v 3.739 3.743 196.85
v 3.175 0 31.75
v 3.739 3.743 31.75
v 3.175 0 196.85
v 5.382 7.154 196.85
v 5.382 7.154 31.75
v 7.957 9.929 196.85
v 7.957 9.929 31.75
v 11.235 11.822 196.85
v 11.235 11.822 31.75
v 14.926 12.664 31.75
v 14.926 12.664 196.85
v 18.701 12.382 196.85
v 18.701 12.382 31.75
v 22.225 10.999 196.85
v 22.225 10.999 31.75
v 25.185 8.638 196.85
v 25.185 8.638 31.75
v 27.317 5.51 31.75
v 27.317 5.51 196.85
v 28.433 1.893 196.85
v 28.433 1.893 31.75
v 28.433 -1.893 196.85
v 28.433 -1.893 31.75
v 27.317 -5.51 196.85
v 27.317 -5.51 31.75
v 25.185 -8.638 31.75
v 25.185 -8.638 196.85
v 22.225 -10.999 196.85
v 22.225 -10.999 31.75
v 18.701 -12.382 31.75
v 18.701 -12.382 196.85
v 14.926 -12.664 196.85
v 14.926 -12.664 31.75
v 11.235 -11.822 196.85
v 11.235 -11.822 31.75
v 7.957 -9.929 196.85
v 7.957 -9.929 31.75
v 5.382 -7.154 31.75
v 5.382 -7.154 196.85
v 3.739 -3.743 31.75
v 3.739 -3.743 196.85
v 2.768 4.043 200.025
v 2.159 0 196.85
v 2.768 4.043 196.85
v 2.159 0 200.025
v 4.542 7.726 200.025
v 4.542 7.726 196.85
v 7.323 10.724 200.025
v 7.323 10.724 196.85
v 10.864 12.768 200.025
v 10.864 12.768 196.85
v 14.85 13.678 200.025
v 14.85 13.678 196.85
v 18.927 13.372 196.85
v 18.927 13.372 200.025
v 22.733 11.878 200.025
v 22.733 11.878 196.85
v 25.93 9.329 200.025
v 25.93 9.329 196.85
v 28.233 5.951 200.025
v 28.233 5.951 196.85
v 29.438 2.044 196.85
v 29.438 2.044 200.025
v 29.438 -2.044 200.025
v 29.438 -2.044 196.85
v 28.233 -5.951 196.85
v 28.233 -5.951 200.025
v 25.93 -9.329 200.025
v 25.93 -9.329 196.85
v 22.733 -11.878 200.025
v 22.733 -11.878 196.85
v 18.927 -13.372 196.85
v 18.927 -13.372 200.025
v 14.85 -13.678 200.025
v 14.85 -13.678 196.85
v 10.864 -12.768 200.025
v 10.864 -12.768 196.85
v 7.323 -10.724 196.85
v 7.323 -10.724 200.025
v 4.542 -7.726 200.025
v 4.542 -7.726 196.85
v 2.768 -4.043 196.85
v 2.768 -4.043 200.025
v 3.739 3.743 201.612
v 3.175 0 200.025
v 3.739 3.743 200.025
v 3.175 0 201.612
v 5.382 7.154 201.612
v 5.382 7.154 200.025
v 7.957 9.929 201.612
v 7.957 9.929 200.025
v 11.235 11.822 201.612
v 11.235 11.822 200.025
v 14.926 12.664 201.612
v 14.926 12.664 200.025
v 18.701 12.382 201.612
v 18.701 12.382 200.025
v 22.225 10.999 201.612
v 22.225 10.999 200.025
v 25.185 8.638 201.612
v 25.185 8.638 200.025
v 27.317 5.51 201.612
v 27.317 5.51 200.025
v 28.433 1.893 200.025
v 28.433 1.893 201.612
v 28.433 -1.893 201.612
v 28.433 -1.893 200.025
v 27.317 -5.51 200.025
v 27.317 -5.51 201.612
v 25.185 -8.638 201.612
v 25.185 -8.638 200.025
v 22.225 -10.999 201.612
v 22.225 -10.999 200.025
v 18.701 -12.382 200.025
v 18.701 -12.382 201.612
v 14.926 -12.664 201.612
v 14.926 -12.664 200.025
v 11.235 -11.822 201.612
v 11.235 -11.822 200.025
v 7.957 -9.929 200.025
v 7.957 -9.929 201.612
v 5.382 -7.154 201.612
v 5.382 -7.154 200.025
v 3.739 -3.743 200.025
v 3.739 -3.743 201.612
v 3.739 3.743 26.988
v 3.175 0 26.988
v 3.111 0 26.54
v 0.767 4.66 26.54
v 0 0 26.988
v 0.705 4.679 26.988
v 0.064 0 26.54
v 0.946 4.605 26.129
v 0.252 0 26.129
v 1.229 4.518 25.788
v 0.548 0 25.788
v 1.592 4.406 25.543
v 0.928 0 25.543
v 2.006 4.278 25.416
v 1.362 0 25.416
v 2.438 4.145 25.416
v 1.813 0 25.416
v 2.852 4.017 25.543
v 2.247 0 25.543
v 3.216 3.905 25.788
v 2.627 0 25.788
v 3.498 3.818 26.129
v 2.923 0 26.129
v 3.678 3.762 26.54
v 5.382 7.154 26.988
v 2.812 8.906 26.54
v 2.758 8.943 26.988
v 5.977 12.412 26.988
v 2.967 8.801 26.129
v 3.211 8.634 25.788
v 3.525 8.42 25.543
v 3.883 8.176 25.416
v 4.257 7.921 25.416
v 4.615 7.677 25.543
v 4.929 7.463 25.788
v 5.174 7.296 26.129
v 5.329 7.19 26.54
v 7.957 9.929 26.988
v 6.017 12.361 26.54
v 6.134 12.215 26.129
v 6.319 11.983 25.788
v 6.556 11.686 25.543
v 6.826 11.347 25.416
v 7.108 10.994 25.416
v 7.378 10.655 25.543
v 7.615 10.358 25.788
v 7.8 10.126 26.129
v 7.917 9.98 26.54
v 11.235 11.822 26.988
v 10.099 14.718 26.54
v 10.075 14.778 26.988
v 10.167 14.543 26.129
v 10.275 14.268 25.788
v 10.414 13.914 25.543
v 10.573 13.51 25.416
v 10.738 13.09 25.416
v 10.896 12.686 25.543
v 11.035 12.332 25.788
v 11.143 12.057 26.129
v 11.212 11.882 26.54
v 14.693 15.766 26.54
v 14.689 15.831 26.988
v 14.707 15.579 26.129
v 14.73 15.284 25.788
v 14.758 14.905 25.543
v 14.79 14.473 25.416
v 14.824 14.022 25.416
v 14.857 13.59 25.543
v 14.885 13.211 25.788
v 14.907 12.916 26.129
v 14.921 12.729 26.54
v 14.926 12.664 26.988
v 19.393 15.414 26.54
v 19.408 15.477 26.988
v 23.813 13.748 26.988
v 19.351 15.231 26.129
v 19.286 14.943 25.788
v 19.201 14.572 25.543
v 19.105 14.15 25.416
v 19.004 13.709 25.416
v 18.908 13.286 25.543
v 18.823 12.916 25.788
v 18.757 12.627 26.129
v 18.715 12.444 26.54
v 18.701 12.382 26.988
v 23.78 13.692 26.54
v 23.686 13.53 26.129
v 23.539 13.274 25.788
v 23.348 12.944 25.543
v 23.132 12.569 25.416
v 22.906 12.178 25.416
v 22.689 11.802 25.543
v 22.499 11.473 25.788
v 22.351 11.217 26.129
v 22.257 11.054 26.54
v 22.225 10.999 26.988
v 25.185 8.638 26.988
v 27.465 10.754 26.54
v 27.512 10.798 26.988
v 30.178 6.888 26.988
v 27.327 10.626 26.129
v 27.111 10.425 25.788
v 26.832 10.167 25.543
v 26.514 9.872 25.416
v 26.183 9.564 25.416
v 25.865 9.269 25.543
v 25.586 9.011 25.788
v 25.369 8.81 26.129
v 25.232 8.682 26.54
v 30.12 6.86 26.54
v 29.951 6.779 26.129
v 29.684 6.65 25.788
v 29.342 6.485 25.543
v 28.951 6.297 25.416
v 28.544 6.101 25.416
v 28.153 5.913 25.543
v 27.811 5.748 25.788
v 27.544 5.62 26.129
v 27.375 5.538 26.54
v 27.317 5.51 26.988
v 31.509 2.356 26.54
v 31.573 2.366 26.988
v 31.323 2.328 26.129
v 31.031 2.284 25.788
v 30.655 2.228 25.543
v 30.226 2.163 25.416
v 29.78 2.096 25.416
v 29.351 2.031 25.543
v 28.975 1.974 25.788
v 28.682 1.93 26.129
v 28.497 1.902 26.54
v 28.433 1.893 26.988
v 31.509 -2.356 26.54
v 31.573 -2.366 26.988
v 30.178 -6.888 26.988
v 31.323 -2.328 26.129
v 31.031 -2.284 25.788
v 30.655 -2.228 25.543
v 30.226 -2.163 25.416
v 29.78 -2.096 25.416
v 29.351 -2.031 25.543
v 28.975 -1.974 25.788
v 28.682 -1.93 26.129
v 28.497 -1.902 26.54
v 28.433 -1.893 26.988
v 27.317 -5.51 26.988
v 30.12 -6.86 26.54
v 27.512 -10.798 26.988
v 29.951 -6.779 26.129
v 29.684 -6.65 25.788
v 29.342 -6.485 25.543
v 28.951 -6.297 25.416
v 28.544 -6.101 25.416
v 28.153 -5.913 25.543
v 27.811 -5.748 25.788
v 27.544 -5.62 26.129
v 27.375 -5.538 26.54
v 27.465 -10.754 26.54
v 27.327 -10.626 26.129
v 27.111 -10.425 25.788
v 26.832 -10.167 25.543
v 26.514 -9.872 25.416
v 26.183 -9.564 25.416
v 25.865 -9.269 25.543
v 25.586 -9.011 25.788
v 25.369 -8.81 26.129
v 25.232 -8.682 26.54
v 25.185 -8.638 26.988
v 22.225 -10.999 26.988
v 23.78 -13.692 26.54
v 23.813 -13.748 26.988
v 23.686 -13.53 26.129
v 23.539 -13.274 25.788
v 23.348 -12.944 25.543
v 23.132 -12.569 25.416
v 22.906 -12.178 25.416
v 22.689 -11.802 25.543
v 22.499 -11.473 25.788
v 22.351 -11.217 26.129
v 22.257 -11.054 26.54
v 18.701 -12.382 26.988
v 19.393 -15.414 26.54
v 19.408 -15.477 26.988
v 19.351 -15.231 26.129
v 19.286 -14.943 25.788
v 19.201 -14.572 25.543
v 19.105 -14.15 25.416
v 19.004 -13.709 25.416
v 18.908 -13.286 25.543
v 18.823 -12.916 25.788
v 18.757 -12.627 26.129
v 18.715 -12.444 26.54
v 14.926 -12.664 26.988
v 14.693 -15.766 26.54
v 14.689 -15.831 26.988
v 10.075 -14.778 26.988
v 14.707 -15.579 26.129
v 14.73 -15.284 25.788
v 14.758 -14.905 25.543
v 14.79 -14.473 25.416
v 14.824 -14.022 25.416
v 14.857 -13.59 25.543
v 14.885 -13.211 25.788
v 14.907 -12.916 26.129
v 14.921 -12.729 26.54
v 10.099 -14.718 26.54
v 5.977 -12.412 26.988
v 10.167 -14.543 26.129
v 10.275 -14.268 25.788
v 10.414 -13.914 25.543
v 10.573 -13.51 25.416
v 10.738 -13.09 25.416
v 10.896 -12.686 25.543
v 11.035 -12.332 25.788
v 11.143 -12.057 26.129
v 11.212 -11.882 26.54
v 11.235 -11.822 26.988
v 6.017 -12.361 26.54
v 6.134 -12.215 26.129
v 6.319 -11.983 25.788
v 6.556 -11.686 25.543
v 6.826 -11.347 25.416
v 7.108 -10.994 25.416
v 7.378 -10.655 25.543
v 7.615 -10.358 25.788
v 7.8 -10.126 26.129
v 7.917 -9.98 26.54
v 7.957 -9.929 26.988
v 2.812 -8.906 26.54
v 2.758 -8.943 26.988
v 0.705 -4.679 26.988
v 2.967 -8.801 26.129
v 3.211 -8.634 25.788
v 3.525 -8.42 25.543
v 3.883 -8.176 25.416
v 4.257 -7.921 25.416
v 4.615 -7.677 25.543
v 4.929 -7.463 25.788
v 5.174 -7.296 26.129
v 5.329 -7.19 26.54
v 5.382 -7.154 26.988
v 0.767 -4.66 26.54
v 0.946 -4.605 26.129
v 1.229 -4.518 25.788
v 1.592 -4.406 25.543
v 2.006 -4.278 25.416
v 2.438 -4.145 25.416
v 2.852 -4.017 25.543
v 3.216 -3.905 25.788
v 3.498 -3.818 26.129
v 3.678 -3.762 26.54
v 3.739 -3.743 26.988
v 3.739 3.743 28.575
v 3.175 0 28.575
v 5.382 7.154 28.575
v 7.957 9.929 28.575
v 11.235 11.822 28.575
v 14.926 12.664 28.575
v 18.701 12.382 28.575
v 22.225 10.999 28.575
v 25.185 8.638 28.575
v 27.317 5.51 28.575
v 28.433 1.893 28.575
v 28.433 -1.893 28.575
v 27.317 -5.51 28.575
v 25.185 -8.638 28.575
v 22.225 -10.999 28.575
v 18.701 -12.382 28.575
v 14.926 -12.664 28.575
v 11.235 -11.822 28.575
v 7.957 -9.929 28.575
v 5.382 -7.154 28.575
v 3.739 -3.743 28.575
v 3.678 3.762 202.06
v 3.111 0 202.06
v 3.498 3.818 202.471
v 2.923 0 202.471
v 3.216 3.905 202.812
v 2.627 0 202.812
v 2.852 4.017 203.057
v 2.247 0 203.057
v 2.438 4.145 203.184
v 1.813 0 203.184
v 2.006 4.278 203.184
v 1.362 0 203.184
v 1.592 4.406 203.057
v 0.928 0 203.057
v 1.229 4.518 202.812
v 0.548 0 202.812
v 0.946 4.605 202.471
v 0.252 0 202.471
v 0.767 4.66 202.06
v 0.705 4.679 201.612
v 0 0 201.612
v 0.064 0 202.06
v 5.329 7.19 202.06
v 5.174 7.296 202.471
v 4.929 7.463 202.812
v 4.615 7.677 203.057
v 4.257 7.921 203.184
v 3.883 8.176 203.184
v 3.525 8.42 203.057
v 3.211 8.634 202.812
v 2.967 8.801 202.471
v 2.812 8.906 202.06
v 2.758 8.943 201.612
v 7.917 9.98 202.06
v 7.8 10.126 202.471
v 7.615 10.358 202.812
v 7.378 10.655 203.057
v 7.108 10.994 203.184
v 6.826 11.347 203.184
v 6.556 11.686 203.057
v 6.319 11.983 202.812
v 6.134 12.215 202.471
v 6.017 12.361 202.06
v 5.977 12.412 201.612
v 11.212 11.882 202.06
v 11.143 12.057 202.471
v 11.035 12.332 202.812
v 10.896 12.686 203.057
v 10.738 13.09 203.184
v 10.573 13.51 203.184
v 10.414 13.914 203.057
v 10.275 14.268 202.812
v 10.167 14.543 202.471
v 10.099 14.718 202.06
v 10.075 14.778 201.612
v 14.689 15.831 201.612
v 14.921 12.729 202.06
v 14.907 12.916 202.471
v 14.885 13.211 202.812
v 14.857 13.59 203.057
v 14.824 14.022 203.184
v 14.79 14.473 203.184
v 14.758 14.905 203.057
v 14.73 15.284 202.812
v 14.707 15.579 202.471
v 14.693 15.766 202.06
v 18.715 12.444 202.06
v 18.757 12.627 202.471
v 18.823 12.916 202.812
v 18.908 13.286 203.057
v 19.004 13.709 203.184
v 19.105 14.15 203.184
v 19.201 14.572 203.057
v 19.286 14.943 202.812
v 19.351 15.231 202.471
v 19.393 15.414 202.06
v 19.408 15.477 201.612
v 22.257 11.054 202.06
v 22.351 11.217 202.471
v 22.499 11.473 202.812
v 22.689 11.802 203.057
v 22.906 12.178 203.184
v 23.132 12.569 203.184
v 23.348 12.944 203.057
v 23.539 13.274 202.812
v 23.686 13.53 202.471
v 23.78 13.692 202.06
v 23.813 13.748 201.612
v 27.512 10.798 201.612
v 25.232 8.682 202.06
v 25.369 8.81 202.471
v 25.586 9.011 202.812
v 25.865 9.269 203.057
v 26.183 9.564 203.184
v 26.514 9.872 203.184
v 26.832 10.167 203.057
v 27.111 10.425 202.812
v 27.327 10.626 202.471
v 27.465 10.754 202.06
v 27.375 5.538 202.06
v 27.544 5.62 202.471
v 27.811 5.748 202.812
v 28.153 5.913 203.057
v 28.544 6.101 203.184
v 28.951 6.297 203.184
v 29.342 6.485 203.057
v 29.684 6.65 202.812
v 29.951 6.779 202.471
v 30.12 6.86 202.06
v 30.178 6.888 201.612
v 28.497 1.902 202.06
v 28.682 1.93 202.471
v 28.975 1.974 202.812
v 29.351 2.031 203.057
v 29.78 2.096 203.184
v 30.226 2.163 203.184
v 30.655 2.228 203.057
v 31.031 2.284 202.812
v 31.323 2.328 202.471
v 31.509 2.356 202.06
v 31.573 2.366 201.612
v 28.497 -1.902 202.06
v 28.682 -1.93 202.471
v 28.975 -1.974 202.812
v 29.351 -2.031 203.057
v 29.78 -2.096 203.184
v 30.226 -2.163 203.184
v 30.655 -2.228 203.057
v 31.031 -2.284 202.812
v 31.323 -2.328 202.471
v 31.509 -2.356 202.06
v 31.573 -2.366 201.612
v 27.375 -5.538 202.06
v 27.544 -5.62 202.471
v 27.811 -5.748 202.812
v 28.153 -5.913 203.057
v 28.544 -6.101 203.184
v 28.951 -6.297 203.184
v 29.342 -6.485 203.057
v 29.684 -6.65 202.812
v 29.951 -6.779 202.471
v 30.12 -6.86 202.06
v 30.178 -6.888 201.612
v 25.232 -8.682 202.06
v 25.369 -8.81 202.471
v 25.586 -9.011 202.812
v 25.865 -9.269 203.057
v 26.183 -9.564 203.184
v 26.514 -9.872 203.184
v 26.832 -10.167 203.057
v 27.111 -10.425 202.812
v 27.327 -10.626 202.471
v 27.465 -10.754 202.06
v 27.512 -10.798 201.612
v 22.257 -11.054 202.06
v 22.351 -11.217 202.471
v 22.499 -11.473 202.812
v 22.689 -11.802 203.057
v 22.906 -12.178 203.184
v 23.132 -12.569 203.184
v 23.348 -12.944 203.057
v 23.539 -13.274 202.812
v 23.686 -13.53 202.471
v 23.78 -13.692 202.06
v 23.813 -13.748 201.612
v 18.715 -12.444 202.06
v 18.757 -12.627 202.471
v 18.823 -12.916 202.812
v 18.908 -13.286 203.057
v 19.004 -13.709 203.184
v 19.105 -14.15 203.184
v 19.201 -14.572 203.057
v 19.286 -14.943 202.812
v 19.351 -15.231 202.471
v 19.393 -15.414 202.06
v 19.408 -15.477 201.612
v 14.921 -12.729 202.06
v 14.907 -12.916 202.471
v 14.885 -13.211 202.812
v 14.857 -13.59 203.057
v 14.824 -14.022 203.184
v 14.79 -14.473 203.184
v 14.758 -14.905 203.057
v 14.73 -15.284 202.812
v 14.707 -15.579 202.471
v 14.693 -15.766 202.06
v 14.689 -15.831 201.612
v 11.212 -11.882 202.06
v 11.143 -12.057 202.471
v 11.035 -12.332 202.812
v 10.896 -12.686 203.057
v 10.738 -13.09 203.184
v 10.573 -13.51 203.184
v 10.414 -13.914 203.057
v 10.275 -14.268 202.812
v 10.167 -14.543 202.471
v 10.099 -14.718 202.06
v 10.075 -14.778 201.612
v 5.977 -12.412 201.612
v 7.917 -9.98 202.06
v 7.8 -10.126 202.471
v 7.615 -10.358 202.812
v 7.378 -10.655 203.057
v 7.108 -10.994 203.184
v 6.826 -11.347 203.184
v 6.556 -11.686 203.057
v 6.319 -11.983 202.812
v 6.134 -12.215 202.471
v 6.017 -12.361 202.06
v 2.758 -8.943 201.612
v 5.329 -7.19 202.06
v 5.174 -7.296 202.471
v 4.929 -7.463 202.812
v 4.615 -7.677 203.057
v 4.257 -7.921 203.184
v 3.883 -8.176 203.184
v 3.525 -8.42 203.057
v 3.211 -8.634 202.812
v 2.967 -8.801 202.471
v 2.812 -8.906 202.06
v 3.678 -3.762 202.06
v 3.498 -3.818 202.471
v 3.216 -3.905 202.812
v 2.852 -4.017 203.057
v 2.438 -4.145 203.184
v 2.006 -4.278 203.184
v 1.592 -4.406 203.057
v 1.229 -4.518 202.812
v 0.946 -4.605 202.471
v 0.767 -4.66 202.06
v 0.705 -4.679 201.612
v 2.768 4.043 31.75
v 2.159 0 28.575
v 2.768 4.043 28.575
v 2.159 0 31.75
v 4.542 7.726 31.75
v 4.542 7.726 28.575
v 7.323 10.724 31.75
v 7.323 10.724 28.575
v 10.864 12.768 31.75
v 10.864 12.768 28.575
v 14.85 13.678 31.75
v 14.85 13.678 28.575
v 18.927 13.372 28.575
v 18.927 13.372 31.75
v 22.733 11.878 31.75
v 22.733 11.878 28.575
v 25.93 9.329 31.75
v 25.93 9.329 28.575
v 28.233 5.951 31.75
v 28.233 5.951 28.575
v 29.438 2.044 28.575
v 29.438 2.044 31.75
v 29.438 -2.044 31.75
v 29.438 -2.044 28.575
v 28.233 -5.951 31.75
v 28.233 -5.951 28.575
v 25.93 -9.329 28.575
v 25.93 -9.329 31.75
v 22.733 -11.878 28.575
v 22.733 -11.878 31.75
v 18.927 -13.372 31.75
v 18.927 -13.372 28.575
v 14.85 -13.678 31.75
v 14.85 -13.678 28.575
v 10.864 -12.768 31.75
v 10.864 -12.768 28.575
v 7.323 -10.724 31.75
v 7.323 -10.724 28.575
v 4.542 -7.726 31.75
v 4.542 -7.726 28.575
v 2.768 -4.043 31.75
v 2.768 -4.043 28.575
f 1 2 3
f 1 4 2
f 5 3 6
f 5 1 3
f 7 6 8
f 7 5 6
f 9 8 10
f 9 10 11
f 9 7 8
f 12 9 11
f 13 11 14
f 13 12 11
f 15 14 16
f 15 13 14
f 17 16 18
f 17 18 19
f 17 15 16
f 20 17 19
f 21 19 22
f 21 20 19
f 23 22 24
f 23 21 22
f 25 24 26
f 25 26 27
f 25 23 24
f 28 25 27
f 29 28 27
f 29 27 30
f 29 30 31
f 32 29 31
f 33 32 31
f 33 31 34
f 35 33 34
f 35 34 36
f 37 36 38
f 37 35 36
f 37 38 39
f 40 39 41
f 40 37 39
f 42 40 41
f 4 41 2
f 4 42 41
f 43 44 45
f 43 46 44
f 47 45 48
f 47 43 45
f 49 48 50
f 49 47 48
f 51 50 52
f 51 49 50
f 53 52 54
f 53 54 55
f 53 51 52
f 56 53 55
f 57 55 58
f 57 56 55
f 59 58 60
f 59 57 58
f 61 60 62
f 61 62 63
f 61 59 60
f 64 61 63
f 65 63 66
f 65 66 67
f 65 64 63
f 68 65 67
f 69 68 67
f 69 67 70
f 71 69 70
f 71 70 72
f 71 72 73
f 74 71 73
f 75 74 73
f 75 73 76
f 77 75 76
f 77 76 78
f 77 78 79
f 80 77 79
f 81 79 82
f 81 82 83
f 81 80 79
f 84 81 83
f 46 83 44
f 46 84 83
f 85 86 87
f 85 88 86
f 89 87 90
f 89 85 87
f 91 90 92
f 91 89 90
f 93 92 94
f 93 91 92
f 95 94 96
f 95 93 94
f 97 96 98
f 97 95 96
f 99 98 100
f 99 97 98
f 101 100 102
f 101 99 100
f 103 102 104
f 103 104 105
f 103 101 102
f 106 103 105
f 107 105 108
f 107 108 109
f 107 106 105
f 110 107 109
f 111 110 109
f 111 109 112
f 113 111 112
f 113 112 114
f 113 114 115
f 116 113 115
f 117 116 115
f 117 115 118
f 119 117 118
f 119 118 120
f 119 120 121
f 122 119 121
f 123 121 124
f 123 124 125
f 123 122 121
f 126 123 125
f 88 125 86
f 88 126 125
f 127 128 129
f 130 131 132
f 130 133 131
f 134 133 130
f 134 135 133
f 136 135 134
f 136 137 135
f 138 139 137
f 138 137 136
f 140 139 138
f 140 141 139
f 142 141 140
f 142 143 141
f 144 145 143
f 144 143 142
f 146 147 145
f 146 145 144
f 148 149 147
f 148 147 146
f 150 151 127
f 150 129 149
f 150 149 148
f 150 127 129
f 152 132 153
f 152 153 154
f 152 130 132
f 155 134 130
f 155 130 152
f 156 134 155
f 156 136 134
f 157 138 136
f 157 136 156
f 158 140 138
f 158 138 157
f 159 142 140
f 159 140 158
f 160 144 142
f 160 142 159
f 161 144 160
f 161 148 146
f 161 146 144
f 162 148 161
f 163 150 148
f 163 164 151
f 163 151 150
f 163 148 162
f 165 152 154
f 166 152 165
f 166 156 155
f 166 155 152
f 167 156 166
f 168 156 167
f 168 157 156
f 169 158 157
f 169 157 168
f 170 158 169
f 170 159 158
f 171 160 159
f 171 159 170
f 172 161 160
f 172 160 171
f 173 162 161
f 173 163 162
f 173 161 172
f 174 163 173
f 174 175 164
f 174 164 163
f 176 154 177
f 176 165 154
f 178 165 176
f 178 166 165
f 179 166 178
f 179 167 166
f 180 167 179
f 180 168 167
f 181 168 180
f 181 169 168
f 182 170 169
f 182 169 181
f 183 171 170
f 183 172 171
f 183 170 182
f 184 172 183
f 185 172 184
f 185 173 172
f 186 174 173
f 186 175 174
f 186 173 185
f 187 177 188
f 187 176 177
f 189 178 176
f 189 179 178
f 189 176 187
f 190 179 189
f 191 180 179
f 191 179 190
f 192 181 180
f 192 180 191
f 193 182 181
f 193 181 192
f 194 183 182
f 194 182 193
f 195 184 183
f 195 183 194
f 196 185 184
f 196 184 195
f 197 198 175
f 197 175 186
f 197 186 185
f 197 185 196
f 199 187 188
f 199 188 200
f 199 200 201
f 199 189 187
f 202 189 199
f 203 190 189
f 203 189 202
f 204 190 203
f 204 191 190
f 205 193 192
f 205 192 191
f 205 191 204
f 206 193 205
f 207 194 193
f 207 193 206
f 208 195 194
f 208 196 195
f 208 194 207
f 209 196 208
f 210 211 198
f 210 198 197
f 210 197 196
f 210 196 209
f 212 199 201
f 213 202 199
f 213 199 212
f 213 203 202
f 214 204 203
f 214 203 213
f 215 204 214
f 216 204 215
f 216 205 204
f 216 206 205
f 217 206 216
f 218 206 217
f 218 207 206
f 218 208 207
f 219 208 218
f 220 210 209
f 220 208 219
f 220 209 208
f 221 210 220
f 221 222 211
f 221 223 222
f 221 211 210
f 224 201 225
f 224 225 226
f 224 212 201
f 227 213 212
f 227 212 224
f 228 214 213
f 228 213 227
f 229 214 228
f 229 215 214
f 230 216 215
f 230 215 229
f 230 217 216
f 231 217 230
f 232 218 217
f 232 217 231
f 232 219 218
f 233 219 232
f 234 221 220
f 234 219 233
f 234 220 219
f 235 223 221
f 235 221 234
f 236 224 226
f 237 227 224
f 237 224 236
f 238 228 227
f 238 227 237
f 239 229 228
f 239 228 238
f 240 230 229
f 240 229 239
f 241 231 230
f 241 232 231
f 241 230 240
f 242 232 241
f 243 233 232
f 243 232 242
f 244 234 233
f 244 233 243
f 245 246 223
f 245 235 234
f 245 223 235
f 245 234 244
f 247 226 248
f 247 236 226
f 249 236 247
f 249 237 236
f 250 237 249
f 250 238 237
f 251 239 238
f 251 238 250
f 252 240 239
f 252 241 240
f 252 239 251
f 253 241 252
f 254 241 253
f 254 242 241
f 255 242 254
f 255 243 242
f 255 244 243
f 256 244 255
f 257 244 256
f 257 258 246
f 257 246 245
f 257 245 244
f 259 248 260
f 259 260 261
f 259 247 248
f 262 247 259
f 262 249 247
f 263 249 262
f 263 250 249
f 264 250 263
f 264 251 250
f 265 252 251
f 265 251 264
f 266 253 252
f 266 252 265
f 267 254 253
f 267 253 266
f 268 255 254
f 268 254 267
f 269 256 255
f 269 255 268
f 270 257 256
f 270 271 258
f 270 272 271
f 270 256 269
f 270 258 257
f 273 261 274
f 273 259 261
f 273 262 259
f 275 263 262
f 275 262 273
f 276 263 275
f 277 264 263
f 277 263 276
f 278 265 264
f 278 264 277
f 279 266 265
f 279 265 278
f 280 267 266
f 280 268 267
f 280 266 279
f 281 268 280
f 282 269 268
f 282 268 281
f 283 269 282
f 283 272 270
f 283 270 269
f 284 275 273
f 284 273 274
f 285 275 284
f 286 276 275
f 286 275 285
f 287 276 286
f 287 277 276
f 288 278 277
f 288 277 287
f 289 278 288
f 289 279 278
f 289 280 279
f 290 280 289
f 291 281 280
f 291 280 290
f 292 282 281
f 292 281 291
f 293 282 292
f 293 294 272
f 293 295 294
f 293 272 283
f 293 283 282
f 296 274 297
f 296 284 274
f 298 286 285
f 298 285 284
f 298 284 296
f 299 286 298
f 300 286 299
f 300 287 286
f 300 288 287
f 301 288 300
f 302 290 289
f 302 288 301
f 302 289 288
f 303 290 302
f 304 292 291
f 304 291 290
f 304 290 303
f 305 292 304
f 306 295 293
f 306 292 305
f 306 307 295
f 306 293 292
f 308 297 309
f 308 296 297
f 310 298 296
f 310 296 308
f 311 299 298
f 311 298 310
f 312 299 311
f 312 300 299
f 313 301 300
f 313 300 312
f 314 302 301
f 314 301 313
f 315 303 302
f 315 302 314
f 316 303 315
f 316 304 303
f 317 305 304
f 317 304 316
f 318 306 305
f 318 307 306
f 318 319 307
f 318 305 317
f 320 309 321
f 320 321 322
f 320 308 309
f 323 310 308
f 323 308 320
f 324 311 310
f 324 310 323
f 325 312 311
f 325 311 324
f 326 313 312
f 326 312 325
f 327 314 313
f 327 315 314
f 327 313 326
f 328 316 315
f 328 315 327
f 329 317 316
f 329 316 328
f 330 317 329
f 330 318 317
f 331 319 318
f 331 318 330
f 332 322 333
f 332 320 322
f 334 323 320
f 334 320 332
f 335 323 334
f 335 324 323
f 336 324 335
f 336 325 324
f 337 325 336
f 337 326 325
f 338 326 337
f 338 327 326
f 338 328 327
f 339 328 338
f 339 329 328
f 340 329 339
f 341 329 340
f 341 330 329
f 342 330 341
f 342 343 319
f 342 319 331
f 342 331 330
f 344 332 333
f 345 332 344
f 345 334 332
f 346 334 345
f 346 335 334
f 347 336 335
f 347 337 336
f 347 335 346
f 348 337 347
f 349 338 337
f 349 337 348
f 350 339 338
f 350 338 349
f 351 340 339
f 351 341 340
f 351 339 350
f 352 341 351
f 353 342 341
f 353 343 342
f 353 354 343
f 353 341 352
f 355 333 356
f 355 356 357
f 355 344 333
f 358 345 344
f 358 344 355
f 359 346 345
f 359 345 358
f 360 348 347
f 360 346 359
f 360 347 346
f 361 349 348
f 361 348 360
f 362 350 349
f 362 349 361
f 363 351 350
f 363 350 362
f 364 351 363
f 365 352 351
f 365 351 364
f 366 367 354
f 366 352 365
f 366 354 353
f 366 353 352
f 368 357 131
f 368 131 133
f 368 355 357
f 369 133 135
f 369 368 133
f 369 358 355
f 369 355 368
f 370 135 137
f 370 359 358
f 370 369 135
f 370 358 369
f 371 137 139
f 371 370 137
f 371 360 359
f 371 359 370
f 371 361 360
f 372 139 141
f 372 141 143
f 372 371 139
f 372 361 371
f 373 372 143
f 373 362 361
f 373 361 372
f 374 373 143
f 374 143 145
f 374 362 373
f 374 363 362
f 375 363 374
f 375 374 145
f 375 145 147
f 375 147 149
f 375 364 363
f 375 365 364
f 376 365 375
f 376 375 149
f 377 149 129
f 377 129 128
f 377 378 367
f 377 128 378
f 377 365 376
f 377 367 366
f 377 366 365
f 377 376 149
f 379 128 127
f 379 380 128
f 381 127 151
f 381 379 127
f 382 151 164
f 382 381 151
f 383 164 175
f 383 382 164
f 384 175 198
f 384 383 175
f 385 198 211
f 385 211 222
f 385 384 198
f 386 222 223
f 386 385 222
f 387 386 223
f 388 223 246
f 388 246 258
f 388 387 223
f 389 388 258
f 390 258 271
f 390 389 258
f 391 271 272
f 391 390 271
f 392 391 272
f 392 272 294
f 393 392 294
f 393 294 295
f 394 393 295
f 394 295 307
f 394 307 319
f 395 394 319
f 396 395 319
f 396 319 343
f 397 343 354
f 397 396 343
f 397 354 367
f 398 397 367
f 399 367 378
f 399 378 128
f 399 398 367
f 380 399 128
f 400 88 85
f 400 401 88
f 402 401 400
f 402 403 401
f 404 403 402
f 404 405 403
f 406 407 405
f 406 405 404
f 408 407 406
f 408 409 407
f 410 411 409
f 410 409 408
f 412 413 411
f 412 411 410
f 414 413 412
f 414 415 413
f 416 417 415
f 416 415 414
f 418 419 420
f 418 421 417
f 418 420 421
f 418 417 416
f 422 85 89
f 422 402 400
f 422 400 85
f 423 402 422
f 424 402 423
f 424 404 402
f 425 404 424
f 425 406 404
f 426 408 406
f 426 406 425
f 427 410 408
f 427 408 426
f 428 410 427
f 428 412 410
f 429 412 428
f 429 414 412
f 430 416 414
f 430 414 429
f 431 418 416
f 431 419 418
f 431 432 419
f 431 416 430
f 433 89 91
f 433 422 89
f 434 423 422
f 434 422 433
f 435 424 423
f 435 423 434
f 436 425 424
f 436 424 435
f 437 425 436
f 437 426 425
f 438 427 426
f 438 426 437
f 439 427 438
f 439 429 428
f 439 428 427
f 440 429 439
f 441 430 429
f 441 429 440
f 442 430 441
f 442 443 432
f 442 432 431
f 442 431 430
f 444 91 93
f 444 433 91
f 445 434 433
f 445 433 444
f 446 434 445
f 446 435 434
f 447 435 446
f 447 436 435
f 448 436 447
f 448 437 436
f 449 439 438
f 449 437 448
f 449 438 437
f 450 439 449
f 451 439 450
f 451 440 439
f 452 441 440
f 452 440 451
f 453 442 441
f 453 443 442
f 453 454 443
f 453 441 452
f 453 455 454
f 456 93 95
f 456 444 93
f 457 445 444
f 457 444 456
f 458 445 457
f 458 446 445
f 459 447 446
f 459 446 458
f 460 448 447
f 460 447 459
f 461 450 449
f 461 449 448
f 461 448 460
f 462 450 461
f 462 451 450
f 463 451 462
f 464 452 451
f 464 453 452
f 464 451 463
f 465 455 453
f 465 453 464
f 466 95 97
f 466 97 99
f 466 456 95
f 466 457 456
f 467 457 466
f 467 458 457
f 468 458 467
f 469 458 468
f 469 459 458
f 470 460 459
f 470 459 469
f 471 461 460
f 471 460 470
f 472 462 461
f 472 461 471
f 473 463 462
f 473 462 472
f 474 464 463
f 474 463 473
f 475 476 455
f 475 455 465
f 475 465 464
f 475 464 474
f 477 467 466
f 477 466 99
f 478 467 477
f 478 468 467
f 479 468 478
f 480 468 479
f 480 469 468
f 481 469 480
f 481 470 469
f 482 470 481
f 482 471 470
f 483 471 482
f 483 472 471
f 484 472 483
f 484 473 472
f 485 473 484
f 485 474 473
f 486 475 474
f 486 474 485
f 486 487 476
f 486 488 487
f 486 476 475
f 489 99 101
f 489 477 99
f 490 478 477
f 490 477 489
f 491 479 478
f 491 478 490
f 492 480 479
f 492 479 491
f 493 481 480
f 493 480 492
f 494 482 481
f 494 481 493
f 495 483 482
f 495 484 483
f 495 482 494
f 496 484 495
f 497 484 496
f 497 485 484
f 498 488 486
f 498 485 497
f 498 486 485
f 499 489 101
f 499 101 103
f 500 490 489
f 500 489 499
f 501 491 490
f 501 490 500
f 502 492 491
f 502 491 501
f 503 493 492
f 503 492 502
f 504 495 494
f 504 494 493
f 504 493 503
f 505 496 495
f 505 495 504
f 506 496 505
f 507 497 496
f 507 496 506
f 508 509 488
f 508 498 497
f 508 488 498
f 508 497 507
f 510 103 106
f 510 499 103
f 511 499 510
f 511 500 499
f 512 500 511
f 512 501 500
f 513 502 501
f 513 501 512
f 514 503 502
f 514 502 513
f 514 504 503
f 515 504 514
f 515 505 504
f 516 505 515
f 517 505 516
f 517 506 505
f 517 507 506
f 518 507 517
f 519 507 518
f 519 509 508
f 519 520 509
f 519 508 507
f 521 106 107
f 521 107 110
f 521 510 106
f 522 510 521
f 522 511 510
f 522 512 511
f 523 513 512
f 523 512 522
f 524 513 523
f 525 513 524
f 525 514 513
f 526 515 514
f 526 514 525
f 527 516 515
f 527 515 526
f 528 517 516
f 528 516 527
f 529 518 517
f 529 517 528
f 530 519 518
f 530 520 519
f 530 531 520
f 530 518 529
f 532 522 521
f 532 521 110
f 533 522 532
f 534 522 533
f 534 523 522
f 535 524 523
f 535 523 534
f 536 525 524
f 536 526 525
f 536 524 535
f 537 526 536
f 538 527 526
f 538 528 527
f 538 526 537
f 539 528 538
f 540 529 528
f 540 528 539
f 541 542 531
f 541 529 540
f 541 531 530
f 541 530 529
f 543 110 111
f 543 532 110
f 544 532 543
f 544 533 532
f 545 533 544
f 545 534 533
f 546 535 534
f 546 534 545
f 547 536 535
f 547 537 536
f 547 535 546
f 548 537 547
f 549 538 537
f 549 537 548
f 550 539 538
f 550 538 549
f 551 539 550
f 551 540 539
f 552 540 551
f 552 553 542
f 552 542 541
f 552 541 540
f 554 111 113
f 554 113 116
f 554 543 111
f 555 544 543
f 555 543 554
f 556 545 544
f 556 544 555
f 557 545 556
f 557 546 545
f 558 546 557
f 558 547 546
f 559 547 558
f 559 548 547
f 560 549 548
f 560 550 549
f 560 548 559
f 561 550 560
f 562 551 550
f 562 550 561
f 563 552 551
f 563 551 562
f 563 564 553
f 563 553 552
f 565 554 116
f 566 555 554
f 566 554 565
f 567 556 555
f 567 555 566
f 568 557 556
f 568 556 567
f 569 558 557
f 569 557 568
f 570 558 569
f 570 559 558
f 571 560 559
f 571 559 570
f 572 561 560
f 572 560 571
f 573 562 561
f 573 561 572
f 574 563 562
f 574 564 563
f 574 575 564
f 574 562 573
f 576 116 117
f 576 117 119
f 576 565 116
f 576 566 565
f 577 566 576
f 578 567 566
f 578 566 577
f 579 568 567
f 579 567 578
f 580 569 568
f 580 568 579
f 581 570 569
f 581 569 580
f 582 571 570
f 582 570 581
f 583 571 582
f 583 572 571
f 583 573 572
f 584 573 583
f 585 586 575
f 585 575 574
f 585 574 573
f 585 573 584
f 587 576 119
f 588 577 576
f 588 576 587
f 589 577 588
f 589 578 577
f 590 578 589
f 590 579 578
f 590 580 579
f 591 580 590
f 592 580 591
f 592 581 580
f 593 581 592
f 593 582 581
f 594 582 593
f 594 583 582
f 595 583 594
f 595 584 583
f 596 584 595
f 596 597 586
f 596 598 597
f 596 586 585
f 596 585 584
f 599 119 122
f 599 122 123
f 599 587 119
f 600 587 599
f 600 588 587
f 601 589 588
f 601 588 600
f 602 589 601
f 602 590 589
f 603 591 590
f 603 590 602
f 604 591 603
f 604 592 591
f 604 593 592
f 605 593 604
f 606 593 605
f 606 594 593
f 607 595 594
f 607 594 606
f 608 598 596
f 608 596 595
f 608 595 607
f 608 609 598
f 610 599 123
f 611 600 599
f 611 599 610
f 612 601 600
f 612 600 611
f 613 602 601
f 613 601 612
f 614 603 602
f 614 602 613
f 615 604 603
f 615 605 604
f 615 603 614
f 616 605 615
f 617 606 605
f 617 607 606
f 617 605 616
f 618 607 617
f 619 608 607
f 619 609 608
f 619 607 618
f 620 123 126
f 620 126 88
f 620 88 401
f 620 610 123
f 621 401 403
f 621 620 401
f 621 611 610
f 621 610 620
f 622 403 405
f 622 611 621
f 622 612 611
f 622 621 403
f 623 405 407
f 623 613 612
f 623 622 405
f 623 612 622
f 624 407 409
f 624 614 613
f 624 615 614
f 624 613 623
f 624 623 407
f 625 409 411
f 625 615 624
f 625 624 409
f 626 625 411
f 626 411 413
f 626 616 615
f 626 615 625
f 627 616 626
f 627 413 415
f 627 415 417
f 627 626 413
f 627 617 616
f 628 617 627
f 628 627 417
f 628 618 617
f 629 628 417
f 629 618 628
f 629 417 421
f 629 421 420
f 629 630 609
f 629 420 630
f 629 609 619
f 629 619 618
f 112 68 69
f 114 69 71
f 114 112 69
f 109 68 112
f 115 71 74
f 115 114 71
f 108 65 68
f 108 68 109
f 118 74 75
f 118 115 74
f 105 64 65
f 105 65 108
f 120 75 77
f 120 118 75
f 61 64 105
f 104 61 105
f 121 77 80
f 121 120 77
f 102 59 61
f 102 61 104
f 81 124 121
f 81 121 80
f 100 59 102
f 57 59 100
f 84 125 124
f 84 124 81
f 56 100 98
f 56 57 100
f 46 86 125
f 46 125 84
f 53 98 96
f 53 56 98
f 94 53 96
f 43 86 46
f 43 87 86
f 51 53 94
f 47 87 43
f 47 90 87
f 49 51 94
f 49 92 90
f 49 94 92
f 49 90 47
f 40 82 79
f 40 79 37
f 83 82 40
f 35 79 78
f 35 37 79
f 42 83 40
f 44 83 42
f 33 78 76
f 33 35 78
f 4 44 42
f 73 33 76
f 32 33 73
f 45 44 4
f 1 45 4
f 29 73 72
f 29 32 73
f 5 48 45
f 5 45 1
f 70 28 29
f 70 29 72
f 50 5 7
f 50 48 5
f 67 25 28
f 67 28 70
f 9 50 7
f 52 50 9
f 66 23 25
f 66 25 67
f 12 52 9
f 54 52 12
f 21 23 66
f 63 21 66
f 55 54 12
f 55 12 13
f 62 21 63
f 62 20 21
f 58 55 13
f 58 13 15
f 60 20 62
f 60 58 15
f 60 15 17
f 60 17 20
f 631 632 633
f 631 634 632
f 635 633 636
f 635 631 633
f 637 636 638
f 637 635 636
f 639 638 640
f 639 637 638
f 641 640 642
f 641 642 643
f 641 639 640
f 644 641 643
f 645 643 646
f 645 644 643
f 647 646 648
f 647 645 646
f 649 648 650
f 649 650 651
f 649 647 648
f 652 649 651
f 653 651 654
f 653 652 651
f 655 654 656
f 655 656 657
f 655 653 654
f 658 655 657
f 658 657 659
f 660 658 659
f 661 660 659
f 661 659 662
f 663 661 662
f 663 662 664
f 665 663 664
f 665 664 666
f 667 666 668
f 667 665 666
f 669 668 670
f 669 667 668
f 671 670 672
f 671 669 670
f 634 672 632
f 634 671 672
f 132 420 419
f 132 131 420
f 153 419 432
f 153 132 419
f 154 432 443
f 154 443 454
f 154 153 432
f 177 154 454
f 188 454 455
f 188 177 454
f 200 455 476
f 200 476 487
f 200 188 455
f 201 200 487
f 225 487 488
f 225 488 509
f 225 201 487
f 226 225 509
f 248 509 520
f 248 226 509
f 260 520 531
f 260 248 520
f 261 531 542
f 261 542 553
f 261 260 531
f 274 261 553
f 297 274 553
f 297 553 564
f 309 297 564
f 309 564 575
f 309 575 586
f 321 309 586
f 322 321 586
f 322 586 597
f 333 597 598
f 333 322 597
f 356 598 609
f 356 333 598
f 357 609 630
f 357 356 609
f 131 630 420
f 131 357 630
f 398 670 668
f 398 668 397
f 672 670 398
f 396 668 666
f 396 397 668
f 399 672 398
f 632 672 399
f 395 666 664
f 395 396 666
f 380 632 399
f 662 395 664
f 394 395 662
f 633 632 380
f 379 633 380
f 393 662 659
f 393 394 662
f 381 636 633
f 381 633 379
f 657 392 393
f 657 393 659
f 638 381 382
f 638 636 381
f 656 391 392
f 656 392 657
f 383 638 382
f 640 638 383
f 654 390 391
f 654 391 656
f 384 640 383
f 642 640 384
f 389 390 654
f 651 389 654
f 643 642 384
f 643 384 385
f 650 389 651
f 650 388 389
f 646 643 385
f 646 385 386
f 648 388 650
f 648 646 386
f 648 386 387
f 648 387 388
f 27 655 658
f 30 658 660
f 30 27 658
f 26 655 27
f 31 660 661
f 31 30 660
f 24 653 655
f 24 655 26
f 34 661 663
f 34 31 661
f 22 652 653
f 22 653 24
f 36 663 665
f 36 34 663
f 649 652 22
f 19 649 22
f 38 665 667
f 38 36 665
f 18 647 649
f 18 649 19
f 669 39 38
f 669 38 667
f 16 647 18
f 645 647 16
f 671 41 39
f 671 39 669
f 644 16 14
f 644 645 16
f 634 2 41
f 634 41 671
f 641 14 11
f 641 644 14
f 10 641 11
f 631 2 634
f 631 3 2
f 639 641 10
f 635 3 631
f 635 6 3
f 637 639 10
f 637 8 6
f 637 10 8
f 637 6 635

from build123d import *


with BuildPart() as f1:
    # F0 (on Front) → F1 (revolve)
    with BuildSketch(Plane.XZ):
        with BuildLine():
            Line((0, 201.6125), (0, 114.3))
            Line((0, 114.3), (0, 26.9875))
            ThreePointArc((0, 26.9875), (1.5875, 25.4), (3.175, 26.9875))
            Line((3.175, 26.9875), (3.175, 28.575))
            Line((3.175, 28.575), (2.159, 28.575))
            Line((2.159, 28.575), (2.159, 31.75))
            Line((2.159, 31.75), (3.175, 31.75))
            Line((3.175, 31.75), (3.175, 114.3))
            Line((3.175, 114.3), (3.175, 196.85))
            Line((3.175, 196.85), (2.159, 196.85))
            Line((2.159, 196.85), (2.159, 200.025))
            Line((2.159, 200.025), (3.175, 200.025))
            Line((3.175, 200.025), (3.175, 201.6125))
            ThreePointArc((3.175, 201.6125), (1.5875, 203.2), (0, 201.6125))
        make_face()
    revolve(axis=Axis((15.875, 0, 158.75), (0, 0, -1)))


solid = f1.part
